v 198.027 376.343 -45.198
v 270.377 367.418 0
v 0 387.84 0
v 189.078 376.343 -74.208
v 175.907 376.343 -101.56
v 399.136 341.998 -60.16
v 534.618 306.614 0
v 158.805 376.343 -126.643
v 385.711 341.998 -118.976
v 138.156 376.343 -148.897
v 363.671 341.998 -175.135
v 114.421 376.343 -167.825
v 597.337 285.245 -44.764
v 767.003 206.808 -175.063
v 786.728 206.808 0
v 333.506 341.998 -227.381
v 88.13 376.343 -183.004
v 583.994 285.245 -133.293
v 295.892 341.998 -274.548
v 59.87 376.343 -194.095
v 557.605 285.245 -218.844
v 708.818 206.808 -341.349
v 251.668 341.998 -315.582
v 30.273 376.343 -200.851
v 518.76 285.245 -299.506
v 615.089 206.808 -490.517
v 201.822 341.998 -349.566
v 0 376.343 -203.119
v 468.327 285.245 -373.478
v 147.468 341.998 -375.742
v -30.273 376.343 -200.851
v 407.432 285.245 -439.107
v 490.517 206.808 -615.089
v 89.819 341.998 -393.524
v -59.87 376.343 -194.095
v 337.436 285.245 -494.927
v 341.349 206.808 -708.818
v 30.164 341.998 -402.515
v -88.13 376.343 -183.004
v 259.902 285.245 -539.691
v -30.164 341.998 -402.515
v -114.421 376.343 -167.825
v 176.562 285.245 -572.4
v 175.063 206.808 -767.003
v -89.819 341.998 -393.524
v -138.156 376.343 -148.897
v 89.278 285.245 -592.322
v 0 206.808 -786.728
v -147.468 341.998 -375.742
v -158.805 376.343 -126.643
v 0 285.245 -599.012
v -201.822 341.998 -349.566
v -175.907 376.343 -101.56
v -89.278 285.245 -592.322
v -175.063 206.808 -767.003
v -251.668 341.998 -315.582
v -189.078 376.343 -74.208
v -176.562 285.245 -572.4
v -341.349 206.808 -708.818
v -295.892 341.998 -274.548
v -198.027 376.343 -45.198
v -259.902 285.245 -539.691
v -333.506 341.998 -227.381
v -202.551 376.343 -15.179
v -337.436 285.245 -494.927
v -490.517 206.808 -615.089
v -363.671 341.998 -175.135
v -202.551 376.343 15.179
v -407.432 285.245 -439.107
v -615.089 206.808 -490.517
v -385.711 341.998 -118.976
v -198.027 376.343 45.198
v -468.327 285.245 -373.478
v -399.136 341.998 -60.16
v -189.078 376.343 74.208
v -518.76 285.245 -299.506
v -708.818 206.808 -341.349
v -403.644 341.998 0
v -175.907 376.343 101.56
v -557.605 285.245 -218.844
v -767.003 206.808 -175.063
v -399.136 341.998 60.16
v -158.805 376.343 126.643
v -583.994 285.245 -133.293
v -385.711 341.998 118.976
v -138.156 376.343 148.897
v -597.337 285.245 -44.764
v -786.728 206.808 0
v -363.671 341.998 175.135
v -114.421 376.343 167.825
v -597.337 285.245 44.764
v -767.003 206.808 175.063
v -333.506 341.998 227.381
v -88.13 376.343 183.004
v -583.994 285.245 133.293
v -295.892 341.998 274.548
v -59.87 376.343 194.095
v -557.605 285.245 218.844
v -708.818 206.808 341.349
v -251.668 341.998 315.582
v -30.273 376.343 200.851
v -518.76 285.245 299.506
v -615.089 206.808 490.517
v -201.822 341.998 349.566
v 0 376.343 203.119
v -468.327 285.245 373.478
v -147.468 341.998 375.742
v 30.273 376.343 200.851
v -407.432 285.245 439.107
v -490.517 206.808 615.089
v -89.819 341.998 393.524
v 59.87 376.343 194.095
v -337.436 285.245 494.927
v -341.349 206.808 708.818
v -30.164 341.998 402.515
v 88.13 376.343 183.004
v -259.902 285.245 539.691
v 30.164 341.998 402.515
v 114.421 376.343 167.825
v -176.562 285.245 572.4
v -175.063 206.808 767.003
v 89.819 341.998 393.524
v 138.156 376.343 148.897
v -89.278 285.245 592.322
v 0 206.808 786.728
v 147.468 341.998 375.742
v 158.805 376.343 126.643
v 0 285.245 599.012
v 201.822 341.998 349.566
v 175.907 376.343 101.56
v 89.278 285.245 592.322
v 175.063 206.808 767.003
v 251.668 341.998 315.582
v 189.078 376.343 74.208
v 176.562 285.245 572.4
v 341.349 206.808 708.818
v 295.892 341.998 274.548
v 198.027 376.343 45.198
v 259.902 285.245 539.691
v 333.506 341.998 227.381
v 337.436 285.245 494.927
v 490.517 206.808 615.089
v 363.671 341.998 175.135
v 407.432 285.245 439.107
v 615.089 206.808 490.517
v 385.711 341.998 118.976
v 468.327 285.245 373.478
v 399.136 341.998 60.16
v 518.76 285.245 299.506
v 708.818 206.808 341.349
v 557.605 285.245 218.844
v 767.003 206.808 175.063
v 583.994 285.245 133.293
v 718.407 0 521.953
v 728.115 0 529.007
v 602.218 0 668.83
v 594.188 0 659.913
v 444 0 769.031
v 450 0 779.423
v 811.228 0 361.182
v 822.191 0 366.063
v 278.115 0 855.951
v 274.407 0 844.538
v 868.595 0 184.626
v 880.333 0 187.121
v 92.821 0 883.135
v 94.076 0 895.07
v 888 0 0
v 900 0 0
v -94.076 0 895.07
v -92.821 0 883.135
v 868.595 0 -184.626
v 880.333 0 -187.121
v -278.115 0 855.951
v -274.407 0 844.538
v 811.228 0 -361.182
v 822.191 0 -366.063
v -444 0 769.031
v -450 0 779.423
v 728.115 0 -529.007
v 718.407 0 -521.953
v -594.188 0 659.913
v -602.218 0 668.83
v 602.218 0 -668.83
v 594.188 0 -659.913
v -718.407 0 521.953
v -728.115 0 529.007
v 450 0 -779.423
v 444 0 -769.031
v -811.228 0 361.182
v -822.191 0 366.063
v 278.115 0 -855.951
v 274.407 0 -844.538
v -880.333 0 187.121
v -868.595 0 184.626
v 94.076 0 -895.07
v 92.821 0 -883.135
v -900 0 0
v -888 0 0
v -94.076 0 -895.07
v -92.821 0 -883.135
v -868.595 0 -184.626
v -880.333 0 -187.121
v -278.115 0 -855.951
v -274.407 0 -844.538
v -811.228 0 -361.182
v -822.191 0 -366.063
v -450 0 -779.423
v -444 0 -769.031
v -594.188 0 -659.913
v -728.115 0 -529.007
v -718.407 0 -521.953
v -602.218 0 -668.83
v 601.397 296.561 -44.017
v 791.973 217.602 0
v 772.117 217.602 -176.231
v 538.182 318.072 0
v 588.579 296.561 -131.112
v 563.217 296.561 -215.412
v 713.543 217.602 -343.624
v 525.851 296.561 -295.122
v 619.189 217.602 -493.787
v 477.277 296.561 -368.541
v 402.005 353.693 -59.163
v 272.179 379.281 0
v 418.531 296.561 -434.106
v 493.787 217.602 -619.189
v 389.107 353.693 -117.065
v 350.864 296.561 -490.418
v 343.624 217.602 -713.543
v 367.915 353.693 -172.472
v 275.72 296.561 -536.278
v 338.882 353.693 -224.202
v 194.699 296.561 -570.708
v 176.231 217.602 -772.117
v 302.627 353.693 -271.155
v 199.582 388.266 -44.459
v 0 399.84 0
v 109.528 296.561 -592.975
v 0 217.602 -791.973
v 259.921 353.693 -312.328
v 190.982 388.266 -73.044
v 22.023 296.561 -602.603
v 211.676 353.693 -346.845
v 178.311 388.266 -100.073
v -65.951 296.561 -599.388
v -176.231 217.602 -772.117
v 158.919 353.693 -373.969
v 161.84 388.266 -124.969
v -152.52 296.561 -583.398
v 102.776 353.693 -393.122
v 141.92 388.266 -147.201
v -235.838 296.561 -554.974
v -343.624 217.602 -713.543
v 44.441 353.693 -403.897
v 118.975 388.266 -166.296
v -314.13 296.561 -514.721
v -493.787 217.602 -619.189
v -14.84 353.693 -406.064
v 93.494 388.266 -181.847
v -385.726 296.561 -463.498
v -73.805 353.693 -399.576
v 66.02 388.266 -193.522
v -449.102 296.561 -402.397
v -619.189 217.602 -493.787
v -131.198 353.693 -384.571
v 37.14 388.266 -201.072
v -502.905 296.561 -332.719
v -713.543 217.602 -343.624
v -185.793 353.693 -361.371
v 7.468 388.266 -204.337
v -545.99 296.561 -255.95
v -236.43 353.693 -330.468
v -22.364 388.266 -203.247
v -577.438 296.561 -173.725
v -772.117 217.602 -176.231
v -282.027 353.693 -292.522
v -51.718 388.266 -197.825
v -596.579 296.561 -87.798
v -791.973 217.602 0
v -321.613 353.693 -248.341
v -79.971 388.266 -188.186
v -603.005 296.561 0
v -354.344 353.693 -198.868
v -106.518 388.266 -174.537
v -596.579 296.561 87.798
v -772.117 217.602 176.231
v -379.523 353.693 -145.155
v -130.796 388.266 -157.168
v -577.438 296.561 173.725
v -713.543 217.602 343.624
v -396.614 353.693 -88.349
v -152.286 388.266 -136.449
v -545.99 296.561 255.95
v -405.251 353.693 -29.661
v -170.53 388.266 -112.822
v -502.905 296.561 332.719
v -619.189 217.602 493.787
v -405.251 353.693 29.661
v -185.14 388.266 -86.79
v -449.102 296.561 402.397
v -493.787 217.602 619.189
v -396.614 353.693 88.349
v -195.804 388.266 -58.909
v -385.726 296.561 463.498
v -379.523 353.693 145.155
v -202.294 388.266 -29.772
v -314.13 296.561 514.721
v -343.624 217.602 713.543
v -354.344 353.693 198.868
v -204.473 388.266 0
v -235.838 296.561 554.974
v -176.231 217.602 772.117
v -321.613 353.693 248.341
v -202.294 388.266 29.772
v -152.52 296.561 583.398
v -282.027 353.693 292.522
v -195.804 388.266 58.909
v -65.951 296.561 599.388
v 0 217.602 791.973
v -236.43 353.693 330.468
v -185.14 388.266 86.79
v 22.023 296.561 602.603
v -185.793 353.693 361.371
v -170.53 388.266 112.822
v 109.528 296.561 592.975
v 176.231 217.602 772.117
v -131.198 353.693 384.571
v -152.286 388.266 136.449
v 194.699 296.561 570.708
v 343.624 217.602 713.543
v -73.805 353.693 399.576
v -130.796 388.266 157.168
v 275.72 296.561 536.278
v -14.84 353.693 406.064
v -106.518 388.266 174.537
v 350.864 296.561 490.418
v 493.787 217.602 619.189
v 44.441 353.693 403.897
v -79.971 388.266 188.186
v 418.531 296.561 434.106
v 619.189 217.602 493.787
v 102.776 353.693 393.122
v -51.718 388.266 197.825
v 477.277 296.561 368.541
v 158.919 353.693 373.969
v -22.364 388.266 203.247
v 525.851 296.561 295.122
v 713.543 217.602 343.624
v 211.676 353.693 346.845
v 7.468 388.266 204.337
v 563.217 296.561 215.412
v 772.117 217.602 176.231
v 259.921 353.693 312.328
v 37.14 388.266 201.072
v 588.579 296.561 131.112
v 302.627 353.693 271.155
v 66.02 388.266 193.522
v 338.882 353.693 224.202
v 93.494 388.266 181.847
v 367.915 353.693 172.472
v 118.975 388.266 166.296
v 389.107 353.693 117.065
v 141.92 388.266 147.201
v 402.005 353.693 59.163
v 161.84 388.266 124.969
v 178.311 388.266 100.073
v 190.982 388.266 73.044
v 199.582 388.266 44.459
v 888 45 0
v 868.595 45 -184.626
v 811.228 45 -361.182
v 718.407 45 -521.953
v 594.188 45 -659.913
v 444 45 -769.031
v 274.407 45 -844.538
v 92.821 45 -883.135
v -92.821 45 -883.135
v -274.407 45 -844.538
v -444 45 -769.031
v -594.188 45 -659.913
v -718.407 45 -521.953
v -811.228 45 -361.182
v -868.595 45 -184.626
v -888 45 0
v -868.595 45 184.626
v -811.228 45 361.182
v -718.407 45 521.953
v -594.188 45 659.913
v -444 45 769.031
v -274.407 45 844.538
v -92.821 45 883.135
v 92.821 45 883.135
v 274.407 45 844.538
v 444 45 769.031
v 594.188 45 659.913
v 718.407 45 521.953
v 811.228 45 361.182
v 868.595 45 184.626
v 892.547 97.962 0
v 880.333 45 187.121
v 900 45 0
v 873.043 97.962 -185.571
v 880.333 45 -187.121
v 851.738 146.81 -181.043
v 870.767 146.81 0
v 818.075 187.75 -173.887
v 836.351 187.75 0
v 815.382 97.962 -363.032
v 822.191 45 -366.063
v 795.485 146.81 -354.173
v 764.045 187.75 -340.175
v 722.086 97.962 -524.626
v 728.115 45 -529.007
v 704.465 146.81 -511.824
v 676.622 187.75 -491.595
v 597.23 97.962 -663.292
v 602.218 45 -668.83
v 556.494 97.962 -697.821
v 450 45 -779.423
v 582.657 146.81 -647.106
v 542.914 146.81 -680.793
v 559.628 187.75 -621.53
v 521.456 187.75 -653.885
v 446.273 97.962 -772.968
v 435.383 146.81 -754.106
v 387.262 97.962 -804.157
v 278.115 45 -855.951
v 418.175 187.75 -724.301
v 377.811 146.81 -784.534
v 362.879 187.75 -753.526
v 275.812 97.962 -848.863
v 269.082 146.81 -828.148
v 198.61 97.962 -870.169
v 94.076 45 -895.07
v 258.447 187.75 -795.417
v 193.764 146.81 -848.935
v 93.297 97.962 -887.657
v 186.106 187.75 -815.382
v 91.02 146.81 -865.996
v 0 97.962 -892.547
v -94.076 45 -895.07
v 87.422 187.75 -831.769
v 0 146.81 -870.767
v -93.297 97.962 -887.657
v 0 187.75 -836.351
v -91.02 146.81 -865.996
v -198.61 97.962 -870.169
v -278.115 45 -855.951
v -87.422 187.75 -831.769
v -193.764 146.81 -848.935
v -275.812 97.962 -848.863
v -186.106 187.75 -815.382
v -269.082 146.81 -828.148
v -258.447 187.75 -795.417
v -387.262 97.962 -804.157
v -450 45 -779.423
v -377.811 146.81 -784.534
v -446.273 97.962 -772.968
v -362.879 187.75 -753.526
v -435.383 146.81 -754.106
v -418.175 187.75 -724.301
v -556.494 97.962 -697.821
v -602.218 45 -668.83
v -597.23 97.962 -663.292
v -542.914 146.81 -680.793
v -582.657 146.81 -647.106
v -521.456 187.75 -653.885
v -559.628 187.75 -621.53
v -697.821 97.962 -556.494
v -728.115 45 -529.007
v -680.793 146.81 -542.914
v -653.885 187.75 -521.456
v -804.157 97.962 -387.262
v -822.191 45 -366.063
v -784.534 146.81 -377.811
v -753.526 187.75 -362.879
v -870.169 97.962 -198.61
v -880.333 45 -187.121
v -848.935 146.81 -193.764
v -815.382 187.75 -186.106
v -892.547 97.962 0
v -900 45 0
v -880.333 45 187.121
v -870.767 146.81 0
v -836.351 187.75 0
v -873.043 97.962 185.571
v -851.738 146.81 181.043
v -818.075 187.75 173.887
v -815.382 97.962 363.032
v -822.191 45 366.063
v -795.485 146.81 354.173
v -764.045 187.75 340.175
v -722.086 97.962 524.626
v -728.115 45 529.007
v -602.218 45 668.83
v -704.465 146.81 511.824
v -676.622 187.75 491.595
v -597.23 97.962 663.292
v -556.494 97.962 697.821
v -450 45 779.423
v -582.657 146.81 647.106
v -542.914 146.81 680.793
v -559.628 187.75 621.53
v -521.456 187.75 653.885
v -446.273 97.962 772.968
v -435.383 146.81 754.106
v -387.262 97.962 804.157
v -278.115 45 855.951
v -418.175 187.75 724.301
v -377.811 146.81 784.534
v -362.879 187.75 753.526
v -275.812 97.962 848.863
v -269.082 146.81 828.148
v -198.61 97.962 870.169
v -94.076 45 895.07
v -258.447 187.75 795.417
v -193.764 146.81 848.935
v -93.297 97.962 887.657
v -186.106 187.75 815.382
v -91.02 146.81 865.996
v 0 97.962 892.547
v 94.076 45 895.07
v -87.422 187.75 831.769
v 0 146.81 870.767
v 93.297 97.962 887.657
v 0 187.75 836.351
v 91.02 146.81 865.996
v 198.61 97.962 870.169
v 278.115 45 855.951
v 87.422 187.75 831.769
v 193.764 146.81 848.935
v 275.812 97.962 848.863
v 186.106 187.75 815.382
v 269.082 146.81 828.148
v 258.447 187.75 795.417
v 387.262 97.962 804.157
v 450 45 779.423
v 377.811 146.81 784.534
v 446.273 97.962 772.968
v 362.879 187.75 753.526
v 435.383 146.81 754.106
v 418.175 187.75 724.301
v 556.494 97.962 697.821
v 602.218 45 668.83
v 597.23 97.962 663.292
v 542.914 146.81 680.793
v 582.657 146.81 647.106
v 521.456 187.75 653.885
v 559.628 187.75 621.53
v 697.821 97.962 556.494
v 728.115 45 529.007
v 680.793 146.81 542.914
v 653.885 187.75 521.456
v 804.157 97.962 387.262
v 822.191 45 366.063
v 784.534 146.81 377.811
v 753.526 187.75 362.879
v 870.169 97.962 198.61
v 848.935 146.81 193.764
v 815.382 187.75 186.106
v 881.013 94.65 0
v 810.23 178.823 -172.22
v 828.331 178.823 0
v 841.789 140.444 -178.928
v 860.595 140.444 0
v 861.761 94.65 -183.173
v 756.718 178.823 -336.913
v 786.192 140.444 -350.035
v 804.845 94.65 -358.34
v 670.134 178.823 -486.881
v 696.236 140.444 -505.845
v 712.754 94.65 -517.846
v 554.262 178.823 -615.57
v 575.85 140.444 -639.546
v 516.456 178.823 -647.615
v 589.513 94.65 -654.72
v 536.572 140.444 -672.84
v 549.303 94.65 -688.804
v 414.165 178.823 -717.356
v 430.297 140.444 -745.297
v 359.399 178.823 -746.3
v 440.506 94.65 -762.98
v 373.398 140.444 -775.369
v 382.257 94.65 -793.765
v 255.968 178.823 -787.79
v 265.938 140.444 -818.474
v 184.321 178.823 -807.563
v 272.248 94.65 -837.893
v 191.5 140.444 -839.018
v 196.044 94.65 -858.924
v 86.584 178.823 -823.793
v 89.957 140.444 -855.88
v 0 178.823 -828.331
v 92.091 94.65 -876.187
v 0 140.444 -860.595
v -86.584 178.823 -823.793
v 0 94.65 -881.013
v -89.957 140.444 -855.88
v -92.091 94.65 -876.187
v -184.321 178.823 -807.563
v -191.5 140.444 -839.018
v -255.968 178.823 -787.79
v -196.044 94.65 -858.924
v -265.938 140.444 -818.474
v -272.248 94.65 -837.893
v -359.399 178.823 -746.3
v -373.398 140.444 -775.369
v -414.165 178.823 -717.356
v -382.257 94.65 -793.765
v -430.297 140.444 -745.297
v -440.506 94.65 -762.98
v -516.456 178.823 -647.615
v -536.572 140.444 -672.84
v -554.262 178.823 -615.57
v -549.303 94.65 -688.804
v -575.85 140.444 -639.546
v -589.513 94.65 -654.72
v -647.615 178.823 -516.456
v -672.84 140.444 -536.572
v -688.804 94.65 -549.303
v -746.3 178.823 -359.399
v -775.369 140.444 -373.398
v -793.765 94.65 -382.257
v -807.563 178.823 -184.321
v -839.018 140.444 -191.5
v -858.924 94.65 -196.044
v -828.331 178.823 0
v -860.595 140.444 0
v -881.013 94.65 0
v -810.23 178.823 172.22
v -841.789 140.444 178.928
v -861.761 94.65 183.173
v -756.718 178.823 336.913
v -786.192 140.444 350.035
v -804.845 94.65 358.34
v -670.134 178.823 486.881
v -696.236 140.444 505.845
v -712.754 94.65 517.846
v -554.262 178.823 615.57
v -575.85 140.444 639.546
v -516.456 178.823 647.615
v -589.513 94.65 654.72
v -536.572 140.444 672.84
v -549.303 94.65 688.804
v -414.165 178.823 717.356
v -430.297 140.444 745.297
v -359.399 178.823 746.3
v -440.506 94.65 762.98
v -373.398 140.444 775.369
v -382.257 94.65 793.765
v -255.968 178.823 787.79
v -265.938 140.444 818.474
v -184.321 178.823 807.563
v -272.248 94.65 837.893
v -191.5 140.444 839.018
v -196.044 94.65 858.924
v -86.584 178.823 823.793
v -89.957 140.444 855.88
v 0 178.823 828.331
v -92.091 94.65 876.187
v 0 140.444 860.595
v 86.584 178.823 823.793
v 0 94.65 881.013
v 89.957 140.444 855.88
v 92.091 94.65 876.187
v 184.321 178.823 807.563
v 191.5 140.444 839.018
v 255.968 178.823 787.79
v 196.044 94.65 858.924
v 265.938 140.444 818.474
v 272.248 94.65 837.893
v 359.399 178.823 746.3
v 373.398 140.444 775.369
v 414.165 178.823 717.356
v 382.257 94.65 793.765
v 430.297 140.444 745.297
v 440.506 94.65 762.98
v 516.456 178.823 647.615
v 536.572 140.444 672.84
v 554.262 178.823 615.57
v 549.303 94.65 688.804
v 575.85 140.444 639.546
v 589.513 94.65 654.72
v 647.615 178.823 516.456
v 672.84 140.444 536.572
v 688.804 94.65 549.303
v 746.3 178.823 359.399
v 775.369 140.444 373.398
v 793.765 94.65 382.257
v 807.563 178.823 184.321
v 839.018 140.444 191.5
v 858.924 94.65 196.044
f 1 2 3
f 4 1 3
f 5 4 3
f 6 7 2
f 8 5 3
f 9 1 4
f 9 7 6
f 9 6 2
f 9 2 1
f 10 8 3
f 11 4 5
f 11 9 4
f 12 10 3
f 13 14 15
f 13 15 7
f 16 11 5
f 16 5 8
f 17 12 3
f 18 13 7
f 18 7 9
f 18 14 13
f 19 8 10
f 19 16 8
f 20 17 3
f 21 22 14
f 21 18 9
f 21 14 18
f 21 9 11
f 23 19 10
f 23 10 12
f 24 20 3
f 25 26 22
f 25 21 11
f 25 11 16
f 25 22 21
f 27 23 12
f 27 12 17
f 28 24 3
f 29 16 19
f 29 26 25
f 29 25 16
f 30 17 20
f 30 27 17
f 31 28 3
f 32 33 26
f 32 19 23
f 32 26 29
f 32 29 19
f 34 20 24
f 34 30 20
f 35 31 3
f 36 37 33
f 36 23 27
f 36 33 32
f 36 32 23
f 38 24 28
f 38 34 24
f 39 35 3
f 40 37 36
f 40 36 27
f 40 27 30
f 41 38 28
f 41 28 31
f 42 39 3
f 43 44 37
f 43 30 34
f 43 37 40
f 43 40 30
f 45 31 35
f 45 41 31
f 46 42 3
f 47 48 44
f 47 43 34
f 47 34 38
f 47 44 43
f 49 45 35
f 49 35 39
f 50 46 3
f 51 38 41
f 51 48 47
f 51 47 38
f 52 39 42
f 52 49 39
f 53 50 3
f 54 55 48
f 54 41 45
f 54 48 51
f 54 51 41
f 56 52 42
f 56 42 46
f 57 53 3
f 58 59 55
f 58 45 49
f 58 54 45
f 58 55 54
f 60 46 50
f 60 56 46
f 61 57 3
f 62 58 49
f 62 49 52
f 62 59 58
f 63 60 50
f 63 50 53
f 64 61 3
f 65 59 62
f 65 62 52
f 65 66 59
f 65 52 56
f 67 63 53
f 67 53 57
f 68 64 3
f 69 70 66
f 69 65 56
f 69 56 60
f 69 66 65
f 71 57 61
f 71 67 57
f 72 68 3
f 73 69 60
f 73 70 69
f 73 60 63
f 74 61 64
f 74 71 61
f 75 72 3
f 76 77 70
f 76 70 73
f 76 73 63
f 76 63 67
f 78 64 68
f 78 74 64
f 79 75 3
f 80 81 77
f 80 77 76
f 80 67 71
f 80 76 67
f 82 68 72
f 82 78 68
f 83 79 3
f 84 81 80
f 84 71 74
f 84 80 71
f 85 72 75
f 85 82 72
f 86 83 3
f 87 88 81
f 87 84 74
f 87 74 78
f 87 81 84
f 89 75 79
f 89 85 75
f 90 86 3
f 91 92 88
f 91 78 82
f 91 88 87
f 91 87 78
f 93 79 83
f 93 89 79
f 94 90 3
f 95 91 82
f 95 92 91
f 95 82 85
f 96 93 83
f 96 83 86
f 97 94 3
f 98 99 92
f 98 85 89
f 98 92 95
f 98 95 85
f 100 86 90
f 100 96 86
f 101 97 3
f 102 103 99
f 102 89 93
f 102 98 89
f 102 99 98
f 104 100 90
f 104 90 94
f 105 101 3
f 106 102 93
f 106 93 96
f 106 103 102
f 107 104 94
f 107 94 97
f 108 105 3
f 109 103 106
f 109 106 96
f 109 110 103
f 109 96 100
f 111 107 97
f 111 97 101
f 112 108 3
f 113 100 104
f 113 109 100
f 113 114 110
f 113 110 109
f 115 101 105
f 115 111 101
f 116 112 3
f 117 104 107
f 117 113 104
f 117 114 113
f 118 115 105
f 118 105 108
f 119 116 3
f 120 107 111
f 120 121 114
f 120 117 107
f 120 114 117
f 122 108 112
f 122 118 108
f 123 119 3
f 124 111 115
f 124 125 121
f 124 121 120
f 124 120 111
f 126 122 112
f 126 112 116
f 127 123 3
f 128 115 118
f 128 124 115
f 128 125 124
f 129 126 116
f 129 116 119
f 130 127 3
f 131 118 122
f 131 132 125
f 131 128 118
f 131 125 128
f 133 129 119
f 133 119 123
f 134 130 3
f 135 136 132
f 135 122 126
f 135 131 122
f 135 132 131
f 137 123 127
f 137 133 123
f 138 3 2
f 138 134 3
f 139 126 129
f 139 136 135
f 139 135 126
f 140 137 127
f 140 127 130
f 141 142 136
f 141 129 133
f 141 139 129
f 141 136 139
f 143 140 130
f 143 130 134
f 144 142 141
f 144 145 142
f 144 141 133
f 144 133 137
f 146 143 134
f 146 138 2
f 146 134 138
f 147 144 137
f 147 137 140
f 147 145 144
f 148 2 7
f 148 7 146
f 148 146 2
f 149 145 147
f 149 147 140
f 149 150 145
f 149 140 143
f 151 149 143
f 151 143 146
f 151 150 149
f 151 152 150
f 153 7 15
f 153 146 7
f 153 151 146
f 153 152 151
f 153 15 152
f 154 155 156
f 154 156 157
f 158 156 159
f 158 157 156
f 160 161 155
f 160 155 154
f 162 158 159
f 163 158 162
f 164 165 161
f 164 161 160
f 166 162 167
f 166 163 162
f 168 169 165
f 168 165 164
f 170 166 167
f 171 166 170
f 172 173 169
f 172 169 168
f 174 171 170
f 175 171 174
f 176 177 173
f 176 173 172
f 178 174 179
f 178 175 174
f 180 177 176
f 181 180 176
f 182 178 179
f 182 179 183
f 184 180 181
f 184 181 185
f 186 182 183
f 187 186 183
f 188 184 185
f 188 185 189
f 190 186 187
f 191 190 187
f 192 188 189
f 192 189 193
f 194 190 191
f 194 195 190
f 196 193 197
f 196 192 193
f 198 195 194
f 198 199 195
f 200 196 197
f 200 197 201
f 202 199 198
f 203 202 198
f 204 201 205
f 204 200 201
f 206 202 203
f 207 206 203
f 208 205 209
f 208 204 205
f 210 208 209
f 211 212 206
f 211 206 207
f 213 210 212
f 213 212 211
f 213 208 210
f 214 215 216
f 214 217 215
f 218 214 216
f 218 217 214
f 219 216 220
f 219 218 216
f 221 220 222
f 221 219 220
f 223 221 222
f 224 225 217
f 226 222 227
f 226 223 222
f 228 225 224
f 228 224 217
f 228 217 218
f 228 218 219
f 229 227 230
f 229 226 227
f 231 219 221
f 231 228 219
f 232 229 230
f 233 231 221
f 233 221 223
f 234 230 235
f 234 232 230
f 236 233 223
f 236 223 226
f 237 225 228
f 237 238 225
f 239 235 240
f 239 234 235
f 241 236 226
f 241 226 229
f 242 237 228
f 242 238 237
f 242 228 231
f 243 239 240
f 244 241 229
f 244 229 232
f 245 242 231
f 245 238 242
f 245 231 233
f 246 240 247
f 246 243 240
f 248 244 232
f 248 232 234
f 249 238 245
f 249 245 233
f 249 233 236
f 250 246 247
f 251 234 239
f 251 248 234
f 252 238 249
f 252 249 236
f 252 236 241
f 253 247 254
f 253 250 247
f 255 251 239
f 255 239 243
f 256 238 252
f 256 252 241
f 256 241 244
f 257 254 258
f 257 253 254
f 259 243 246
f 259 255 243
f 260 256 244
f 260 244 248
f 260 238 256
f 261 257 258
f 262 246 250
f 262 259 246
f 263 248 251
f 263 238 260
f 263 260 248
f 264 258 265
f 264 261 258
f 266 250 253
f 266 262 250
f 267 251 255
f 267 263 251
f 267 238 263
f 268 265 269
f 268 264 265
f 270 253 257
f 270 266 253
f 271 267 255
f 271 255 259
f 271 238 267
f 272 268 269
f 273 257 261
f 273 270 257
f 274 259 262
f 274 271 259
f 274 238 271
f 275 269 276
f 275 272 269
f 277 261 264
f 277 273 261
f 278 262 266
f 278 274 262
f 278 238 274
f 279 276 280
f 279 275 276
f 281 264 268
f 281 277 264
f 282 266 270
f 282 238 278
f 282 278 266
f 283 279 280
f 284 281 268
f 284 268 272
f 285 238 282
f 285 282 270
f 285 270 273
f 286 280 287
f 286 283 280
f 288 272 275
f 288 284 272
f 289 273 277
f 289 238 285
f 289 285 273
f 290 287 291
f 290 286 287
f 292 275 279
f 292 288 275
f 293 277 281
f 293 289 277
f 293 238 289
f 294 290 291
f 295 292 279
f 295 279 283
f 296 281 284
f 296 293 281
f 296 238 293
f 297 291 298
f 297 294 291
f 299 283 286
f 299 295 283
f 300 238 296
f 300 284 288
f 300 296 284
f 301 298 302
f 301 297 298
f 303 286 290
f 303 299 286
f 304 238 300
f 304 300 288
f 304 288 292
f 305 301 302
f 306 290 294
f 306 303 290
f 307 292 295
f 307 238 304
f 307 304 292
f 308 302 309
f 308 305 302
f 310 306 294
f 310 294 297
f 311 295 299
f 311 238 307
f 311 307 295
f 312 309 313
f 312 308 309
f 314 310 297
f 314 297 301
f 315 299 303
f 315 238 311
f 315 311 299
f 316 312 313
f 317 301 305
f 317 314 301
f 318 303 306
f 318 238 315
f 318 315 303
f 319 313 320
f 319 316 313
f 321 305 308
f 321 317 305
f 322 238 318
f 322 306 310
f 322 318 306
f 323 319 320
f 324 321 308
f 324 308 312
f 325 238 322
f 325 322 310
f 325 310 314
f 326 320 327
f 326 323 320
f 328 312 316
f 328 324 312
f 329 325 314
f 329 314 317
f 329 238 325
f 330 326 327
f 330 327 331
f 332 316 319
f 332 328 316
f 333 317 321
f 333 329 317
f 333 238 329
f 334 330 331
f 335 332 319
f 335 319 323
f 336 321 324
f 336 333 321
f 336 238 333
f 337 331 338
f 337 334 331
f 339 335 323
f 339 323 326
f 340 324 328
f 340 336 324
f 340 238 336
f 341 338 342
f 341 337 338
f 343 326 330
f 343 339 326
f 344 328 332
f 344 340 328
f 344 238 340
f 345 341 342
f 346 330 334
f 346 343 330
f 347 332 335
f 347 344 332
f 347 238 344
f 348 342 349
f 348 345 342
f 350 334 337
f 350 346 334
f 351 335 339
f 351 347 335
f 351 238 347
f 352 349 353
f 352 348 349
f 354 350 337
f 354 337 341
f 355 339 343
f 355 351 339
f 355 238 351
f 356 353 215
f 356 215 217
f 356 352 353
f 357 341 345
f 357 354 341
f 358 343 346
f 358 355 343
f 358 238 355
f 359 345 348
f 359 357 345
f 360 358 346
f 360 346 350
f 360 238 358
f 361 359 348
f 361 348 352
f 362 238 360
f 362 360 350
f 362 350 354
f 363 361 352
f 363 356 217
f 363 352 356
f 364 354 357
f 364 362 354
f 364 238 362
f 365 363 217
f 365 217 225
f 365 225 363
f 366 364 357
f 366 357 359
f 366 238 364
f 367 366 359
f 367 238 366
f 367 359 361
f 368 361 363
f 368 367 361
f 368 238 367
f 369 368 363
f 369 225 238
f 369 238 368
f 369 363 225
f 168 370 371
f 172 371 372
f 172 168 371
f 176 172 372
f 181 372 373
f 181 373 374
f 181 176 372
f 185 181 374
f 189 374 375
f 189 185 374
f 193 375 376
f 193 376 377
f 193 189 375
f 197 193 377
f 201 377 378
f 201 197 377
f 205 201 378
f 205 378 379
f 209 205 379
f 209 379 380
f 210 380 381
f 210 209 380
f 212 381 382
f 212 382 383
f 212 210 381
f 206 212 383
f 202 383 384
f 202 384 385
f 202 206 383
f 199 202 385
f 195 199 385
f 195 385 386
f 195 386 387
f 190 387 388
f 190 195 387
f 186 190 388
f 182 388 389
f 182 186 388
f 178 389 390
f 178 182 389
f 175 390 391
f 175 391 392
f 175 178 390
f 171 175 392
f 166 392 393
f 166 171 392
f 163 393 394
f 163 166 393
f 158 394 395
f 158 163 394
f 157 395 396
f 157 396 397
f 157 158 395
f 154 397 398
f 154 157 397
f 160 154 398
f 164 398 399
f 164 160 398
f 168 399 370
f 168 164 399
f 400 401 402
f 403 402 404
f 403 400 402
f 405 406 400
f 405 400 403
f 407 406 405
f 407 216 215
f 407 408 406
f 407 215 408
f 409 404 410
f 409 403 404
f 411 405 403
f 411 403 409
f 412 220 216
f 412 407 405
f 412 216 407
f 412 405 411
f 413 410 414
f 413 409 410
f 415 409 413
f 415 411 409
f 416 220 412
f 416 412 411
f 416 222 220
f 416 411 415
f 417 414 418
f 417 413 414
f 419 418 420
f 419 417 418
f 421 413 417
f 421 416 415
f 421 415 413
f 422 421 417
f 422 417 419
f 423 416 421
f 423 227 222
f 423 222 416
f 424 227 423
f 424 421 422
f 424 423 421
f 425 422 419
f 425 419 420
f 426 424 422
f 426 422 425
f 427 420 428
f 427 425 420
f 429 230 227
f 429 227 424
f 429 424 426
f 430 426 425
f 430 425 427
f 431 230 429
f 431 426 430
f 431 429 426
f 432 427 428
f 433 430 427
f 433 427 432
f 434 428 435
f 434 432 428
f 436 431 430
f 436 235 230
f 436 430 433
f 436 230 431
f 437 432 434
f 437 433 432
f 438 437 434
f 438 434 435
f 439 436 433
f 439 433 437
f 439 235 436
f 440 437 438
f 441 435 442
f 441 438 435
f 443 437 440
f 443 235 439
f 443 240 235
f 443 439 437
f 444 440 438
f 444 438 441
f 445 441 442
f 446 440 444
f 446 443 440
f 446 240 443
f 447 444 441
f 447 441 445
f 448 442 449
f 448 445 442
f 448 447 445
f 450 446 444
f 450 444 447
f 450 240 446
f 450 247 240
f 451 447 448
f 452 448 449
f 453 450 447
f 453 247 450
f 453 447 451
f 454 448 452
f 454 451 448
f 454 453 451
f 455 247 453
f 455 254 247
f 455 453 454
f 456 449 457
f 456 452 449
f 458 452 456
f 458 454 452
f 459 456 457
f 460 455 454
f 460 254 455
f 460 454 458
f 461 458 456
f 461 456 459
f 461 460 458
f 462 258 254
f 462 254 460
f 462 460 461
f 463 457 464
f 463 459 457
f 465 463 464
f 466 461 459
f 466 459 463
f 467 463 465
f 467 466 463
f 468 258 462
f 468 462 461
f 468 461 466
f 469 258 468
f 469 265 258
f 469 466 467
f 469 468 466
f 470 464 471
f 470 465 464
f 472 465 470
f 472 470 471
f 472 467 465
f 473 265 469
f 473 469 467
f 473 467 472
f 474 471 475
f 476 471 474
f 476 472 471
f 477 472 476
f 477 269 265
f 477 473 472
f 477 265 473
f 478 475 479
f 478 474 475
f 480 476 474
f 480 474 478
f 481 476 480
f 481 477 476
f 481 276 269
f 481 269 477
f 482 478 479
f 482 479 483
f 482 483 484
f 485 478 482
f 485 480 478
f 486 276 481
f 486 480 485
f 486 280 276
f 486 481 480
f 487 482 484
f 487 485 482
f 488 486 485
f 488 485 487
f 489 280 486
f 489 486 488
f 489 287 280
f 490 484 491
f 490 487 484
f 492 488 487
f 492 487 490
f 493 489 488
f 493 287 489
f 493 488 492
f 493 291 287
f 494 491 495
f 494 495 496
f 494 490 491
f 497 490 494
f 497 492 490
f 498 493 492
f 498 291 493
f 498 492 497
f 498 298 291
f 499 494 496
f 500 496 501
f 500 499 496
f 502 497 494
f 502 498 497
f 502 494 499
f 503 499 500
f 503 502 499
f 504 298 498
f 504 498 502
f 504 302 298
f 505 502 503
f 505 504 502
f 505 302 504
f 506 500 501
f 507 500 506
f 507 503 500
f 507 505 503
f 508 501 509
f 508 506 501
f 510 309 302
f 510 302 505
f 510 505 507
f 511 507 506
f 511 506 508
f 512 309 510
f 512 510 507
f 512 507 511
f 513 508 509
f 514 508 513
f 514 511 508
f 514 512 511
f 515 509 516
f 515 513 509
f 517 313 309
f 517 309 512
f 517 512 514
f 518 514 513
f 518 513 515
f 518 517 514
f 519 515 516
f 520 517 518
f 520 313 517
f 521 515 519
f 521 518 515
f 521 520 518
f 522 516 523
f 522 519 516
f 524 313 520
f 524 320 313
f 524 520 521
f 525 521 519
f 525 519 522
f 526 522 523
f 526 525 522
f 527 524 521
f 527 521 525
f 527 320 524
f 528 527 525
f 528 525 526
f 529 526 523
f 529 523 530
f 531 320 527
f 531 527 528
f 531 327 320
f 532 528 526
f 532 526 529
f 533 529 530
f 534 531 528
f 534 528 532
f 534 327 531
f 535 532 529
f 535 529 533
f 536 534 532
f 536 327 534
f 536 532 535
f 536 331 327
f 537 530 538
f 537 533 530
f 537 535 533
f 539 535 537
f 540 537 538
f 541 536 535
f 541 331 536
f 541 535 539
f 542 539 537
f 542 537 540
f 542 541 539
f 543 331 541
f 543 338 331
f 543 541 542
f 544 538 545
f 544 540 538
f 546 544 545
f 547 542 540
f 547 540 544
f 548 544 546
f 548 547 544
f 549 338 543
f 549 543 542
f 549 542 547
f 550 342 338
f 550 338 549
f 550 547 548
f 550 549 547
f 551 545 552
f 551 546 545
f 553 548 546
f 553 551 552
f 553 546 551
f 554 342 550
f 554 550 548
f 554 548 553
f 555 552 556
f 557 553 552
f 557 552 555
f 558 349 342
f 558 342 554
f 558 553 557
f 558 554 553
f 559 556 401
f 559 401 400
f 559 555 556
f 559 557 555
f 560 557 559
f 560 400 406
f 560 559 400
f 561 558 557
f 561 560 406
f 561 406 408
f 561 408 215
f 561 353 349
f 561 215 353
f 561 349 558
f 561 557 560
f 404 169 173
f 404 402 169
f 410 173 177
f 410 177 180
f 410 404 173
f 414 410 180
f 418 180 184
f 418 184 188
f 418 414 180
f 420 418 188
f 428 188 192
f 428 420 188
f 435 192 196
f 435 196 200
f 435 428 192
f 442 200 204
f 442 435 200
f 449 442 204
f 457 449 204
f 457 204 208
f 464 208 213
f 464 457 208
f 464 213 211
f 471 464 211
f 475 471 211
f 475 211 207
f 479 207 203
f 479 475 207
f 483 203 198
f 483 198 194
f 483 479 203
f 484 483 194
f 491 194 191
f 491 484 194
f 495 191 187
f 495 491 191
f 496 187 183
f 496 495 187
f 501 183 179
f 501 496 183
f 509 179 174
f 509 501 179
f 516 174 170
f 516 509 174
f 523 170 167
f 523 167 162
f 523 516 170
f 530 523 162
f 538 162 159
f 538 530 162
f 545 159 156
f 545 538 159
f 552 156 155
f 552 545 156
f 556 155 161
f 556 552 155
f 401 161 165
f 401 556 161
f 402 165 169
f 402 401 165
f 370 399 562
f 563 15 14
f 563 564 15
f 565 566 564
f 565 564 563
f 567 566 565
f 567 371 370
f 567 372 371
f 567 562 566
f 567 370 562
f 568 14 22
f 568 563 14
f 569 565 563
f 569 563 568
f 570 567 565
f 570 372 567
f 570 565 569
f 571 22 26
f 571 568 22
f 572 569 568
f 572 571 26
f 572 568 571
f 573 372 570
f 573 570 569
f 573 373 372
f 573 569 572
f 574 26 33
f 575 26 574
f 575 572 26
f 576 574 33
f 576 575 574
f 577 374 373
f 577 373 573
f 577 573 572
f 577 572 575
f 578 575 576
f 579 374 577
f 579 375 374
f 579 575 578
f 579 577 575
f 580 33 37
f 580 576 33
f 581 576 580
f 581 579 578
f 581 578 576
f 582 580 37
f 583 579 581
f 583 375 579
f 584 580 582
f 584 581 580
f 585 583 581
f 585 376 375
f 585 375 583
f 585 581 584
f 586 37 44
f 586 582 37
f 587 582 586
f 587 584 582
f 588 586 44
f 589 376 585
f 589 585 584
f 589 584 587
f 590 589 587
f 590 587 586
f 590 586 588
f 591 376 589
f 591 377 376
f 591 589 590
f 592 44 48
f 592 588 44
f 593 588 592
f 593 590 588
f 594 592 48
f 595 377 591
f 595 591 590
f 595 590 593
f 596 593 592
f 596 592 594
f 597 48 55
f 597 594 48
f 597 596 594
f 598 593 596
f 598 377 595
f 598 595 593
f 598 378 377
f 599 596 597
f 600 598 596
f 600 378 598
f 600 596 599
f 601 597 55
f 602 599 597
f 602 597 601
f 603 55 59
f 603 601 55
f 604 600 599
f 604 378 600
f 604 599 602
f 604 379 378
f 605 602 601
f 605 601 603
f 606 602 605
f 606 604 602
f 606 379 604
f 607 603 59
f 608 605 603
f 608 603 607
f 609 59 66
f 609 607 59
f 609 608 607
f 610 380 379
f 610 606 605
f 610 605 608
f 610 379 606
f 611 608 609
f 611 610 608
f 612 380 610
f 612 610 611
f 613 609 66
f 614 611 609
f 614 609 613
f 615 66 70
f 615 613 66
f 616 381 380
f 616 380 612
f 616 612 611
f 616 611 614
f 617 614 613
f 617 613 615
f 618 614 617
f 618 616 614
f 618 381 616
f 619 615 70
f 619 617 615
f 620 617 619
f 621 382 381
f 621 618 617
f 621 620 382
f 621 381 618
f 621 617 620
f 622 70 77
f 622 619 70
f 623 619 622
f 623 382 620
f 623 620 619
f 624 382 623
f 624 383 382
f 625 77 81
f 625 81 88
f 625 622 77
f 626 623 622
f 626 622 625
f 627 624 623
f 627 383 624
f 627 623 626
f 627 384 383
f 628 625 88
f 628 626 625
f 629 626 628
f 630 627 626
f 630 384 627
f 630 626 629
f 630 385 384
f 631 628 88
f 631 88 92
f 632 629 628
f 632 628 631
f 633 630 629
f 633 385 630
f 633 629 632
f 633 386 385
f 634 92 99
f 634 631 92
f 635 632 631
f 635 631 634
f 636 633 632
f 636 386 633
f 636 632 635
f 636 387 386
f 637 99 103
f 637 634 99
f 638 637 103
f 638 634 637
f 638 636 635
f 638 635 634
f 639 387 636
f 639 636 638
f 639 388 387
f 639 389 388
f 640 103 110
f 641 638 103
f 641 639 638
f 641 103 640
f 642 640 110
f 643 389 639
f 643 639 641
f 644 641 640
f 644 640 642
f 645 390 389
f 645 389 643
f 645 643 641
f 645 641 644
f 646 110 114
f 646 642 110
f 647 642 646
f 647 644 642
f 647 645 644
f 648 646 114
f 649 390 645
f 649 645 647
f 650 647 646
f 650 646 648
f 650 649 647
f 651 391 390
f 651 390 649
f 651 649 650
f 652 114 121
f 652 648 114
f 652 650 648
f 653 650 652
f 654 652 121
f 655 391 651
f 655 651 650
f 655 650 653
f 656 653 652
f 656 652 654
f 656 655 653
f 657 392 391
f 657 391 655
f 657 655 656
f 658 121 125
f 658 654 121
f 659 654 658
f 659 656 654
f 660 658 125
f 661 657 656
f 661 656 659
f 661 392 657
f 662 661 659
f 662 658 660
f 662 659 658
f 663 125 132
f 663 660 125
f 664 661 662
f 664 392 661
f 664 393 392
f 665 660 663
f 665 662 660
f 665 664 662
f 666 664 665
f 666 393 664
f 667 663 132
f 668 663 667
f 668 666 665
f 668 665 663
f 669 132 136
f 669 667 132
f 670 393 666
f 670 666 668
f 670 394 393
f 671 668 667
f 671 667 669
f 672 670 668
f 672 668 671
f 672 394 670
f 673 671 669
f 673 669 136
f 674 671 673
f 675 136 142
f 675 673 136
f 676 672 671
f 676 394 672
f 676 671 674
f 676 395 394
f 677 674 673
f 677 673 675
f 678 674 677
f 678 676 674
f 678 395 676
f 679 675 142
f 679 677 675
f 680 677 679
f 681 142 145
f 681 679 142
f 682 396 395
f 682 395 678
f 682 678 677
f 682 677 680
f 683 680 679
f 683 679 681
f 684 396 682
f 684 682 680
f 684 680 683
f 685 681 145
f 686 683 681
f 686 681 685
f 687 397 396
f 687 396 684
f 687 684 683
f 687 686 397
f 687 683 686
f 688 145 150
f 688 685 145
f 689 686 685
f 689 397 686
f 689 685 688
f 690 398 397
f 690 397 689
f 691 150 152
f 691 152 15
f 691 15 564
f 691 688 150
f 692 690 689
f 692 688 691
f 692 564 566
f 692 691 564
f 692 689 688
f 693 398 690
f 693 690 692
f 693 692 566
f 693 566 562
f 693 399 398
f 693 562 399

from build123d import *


with BuildPart() as part:
    # Rotationsschnitt → Klöpperboden (revolve)
    with BuildSketch(Plane.XY, mode=Mode.PRIVATE) as kl_pperboden_sk:
        with BuildLine():
            Line((-900, 0), (-900, 45))
            ThreePointArc((-900, 45), (-870.766611209, 146.810039133), (-791.972993744, 217.601570654))
            ThreePointArc((-791.972993744, 217.601570654), (-406.334858199, 353.692763685), (0, 399.84))
            Line((0, 399.84), (0, 387.84))
            ThreePointArc((0, 387.84), (-403.643898873, 341.998374521), (-786.72813948, 206.80844767))
            ThreePointArc((-786.72813948, 206.80844767), (-860.594633743, 140.443652841), (-888, 45))
            Line((-888, 45), (-888, 0))
            Line((-888, 0), (-900, 0))
        make_face()
    revolve(kl_pperboden_sk.sketch.rotate(Axis((0, 0, 0), (0, 1, 0)), 180), axis=Axis((0, 0, 0), (0, 1, 0)))  # turned: the seam where the file's is


solid = part.part
